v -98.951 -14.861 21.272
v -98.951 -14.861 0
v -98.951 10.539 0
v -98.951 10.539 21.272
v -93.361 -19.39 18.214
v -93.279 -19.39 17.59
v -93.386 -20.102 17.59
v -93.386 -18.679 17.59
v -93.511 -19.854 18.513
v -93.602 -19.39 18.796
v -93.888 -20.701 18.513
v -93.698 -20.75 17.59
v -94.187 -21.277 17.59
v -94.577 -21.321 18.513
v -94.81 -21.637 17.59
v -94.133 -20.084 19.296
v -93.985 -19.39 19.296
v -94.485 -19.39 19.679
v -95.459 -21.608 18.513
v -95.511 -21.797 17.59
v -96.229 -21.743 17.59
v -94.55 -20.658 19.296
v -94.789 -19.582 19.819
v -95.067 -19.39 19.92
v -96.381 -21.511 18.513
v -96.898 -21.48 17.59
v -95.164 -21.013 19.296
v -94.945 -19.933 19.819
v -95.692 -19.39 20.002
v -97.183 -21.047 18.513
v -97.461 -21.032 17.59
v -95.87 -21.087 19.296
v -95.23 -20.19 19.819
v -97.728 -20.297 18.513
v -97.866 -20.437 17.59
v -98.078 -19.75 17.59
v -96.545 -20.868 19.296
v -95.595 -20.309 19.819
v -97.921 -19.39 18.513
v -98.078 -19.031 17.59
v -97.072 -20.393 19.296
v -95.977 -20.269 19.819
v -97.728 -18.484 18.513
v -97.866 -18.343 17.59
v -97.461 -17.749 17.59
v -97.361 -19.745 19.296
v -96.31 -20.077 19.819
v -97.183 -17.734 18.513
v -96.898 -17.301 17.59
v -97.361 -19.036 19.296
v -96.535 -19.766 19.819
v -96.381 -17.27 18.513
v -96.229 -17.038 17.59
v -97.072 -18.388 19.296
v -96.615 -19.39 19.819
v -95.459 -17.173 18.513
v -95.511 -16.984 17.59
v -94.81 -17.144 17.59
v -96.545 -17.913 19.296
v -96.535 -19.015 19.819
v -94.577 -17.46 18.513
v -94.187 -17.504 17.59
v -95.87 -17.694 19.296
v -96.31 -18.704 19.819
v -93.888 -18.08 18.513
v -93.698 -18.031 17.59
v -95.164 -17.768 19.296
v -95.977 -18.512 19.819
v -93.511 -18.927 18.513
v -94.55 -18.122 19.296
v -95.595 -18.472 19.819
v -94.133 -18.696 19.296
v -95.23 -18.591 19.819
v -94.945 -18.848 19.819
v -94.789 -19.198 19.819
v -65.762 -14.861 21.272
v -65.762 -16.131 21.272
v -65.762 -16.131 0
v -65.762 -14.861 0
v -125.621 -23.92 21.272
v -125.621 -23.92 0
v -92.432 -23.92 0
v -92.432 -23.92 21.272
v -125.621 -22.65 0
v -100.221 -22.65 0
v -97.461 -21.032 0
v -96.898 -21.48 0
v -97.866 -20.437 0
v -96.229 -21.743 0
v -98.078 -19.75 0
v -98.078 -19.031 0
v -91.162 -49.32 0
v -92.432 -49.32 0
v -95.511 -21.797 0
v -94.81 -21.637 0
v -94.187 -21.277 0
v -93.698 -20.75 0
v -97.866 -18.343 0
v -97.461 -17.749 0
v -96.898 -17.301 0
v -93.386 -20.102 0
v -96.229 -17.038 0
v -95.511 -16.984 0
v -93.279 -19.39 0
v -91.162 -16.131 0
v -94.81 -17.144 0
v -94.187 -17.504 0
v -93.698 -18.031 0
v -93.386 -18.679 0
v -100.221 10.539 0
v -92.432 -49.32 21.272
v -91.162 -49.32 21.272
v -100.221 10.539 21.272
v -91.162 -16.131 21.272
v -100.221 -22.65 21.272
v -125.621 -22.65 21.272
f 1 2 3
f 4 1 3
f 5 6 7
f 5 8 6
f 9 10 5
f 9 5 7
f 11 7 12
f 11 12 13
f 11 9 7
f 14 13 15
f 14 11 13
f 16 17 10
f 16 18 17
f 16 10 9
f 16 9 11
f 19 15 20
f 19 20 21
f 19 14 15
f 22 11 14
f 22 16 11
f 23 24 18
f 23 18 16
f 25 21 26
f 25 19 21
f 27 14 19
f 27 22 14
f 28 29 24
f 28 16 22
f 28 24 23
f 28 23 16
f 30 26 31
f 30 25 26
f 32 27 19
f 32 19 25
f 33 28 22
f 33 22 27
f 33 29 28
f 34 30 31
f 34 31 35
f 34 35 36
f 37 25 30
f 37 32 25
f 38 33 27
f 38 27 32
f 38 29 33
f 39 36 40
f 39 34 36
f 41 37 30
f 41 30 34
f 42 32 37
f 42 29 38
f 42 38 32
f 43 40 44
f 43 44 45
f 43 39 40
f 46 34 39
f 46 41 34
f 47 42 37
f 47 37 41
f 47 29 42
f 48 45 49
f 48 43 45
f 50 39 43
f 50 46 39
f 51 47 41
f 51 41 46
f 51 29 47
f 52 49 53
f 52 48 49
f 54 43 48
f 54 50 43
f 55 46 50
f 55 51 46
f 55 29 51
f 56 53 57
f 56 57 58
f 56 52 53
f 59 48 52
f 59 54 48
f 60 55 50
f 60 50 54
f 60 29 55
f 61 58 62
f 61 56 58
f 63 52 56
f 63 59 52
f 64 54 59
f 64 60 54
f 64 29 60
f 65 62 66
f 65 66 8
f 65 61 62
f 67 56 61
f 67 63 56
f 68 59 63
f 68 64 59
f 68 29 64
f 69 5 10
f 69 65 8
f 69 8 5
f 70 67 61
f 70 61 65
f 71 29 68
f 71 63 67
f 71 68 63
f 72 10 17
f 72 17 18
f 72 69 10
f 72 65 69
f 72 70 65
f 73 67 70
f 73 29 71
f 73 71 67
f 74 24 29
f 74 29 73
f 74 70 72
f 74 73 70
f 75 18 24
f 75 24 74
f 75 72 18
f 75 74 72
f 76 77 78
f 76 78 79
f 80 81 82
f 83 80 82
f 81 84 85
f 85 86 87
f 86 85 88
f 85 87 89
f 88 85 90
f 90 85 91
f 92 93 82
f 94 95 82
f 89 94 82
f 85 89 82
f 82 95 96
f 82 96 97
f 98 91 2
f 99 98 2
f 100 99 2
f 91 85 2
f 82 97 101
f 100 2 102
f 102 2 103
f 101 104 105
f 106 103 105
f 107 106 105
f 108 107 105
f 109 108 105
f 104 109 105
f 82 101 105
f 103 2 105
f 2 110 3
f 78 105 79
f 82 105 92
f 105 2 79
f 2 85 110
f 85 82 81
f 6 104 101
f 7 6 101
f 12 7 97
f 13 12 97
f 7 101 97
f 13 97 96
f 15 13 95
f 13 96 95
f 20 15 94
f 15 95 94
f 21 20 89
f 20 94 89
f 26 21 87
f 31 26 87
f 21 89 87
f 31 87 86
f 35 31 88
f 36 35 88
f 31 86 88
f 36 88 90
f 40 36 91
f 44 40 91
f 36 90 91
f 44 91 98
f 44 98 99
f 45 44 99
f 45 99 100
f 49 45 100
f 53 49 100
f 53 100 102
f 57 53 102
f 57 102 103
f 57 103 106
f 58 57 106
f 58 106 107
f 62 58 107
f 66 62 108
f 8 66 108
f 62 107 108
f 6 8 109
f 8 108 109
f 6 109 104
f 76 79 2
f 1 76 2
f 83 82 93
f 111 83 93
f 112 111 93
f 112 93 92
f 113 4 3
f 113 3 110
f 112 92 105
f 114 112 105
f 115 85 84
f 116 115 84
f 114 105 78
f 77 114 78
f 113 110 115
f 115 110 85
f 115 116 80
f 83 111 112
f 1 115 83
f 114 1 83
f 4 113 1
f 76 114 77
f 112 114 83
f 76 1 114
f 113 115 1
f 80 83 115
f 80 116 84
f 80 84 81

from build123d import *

# Parameters (mm, degrees)
F7_DEPTH = 21.2725
F8_R     = 2.413
F9_DEPTH = 20.0025
F10_R    = 2.413


# Not quite as in the source:
# - a variable given as a bare number and used for a length is read in inches; the dataset says mm whatever the document's units were


with BuildPart() as f7:
    # F6 (on Top) → F7 (new body)
    with BuildSketch(Plane.XY):
        Polygon((-100.2214143808, -23.920097865), (-92.4320810475, -23.920097865), (-92.4320810475, -49.320097865), (-91.1620810475, -49.320097865), (-91.1620810475, -23.920097865), (-91.1620810475, -16.1307645317), (-65.7620810475, -16.1307645317), (-65.7620810475, -14.8607645317), (-91.1620810475, -14.8607645317), (-93.2787477141, -14.8607645317), (-98.9514143808, -14.8607645317), (-98.9514143808, 10.5392354683), (-100.2214143808, 10.5392354683), (-100.2214143808, -14.8607645317), (-100.2214143808, -22.650097865), (-125.6214143808, -22.650097865), (-125.6214143808, -23.920097865), align=None)
    extrude(amount=F7_DEPTH)

    # F8 (on face) → F9 (cut)
    with BuildSketch(Plane(origin=(0, 0, 0), x_dir=(1, 0, 0), z_dir=(0, 0, -1))):
        with Locations((-95.6917477141, 19.3904311984)):
            Circle(F8_R)
    extrude(amount=-F9_DEPTH, mode=Mode.SUBTRACT)

    # F10
    f10_edges = [f7.edges().sort_by_distance(p)[0] for p in [
        (-98.104748, -19.390431, 20.0025),
    ]]
    fillet(f10_edges, radius=F10_R)


solid = f7.part
